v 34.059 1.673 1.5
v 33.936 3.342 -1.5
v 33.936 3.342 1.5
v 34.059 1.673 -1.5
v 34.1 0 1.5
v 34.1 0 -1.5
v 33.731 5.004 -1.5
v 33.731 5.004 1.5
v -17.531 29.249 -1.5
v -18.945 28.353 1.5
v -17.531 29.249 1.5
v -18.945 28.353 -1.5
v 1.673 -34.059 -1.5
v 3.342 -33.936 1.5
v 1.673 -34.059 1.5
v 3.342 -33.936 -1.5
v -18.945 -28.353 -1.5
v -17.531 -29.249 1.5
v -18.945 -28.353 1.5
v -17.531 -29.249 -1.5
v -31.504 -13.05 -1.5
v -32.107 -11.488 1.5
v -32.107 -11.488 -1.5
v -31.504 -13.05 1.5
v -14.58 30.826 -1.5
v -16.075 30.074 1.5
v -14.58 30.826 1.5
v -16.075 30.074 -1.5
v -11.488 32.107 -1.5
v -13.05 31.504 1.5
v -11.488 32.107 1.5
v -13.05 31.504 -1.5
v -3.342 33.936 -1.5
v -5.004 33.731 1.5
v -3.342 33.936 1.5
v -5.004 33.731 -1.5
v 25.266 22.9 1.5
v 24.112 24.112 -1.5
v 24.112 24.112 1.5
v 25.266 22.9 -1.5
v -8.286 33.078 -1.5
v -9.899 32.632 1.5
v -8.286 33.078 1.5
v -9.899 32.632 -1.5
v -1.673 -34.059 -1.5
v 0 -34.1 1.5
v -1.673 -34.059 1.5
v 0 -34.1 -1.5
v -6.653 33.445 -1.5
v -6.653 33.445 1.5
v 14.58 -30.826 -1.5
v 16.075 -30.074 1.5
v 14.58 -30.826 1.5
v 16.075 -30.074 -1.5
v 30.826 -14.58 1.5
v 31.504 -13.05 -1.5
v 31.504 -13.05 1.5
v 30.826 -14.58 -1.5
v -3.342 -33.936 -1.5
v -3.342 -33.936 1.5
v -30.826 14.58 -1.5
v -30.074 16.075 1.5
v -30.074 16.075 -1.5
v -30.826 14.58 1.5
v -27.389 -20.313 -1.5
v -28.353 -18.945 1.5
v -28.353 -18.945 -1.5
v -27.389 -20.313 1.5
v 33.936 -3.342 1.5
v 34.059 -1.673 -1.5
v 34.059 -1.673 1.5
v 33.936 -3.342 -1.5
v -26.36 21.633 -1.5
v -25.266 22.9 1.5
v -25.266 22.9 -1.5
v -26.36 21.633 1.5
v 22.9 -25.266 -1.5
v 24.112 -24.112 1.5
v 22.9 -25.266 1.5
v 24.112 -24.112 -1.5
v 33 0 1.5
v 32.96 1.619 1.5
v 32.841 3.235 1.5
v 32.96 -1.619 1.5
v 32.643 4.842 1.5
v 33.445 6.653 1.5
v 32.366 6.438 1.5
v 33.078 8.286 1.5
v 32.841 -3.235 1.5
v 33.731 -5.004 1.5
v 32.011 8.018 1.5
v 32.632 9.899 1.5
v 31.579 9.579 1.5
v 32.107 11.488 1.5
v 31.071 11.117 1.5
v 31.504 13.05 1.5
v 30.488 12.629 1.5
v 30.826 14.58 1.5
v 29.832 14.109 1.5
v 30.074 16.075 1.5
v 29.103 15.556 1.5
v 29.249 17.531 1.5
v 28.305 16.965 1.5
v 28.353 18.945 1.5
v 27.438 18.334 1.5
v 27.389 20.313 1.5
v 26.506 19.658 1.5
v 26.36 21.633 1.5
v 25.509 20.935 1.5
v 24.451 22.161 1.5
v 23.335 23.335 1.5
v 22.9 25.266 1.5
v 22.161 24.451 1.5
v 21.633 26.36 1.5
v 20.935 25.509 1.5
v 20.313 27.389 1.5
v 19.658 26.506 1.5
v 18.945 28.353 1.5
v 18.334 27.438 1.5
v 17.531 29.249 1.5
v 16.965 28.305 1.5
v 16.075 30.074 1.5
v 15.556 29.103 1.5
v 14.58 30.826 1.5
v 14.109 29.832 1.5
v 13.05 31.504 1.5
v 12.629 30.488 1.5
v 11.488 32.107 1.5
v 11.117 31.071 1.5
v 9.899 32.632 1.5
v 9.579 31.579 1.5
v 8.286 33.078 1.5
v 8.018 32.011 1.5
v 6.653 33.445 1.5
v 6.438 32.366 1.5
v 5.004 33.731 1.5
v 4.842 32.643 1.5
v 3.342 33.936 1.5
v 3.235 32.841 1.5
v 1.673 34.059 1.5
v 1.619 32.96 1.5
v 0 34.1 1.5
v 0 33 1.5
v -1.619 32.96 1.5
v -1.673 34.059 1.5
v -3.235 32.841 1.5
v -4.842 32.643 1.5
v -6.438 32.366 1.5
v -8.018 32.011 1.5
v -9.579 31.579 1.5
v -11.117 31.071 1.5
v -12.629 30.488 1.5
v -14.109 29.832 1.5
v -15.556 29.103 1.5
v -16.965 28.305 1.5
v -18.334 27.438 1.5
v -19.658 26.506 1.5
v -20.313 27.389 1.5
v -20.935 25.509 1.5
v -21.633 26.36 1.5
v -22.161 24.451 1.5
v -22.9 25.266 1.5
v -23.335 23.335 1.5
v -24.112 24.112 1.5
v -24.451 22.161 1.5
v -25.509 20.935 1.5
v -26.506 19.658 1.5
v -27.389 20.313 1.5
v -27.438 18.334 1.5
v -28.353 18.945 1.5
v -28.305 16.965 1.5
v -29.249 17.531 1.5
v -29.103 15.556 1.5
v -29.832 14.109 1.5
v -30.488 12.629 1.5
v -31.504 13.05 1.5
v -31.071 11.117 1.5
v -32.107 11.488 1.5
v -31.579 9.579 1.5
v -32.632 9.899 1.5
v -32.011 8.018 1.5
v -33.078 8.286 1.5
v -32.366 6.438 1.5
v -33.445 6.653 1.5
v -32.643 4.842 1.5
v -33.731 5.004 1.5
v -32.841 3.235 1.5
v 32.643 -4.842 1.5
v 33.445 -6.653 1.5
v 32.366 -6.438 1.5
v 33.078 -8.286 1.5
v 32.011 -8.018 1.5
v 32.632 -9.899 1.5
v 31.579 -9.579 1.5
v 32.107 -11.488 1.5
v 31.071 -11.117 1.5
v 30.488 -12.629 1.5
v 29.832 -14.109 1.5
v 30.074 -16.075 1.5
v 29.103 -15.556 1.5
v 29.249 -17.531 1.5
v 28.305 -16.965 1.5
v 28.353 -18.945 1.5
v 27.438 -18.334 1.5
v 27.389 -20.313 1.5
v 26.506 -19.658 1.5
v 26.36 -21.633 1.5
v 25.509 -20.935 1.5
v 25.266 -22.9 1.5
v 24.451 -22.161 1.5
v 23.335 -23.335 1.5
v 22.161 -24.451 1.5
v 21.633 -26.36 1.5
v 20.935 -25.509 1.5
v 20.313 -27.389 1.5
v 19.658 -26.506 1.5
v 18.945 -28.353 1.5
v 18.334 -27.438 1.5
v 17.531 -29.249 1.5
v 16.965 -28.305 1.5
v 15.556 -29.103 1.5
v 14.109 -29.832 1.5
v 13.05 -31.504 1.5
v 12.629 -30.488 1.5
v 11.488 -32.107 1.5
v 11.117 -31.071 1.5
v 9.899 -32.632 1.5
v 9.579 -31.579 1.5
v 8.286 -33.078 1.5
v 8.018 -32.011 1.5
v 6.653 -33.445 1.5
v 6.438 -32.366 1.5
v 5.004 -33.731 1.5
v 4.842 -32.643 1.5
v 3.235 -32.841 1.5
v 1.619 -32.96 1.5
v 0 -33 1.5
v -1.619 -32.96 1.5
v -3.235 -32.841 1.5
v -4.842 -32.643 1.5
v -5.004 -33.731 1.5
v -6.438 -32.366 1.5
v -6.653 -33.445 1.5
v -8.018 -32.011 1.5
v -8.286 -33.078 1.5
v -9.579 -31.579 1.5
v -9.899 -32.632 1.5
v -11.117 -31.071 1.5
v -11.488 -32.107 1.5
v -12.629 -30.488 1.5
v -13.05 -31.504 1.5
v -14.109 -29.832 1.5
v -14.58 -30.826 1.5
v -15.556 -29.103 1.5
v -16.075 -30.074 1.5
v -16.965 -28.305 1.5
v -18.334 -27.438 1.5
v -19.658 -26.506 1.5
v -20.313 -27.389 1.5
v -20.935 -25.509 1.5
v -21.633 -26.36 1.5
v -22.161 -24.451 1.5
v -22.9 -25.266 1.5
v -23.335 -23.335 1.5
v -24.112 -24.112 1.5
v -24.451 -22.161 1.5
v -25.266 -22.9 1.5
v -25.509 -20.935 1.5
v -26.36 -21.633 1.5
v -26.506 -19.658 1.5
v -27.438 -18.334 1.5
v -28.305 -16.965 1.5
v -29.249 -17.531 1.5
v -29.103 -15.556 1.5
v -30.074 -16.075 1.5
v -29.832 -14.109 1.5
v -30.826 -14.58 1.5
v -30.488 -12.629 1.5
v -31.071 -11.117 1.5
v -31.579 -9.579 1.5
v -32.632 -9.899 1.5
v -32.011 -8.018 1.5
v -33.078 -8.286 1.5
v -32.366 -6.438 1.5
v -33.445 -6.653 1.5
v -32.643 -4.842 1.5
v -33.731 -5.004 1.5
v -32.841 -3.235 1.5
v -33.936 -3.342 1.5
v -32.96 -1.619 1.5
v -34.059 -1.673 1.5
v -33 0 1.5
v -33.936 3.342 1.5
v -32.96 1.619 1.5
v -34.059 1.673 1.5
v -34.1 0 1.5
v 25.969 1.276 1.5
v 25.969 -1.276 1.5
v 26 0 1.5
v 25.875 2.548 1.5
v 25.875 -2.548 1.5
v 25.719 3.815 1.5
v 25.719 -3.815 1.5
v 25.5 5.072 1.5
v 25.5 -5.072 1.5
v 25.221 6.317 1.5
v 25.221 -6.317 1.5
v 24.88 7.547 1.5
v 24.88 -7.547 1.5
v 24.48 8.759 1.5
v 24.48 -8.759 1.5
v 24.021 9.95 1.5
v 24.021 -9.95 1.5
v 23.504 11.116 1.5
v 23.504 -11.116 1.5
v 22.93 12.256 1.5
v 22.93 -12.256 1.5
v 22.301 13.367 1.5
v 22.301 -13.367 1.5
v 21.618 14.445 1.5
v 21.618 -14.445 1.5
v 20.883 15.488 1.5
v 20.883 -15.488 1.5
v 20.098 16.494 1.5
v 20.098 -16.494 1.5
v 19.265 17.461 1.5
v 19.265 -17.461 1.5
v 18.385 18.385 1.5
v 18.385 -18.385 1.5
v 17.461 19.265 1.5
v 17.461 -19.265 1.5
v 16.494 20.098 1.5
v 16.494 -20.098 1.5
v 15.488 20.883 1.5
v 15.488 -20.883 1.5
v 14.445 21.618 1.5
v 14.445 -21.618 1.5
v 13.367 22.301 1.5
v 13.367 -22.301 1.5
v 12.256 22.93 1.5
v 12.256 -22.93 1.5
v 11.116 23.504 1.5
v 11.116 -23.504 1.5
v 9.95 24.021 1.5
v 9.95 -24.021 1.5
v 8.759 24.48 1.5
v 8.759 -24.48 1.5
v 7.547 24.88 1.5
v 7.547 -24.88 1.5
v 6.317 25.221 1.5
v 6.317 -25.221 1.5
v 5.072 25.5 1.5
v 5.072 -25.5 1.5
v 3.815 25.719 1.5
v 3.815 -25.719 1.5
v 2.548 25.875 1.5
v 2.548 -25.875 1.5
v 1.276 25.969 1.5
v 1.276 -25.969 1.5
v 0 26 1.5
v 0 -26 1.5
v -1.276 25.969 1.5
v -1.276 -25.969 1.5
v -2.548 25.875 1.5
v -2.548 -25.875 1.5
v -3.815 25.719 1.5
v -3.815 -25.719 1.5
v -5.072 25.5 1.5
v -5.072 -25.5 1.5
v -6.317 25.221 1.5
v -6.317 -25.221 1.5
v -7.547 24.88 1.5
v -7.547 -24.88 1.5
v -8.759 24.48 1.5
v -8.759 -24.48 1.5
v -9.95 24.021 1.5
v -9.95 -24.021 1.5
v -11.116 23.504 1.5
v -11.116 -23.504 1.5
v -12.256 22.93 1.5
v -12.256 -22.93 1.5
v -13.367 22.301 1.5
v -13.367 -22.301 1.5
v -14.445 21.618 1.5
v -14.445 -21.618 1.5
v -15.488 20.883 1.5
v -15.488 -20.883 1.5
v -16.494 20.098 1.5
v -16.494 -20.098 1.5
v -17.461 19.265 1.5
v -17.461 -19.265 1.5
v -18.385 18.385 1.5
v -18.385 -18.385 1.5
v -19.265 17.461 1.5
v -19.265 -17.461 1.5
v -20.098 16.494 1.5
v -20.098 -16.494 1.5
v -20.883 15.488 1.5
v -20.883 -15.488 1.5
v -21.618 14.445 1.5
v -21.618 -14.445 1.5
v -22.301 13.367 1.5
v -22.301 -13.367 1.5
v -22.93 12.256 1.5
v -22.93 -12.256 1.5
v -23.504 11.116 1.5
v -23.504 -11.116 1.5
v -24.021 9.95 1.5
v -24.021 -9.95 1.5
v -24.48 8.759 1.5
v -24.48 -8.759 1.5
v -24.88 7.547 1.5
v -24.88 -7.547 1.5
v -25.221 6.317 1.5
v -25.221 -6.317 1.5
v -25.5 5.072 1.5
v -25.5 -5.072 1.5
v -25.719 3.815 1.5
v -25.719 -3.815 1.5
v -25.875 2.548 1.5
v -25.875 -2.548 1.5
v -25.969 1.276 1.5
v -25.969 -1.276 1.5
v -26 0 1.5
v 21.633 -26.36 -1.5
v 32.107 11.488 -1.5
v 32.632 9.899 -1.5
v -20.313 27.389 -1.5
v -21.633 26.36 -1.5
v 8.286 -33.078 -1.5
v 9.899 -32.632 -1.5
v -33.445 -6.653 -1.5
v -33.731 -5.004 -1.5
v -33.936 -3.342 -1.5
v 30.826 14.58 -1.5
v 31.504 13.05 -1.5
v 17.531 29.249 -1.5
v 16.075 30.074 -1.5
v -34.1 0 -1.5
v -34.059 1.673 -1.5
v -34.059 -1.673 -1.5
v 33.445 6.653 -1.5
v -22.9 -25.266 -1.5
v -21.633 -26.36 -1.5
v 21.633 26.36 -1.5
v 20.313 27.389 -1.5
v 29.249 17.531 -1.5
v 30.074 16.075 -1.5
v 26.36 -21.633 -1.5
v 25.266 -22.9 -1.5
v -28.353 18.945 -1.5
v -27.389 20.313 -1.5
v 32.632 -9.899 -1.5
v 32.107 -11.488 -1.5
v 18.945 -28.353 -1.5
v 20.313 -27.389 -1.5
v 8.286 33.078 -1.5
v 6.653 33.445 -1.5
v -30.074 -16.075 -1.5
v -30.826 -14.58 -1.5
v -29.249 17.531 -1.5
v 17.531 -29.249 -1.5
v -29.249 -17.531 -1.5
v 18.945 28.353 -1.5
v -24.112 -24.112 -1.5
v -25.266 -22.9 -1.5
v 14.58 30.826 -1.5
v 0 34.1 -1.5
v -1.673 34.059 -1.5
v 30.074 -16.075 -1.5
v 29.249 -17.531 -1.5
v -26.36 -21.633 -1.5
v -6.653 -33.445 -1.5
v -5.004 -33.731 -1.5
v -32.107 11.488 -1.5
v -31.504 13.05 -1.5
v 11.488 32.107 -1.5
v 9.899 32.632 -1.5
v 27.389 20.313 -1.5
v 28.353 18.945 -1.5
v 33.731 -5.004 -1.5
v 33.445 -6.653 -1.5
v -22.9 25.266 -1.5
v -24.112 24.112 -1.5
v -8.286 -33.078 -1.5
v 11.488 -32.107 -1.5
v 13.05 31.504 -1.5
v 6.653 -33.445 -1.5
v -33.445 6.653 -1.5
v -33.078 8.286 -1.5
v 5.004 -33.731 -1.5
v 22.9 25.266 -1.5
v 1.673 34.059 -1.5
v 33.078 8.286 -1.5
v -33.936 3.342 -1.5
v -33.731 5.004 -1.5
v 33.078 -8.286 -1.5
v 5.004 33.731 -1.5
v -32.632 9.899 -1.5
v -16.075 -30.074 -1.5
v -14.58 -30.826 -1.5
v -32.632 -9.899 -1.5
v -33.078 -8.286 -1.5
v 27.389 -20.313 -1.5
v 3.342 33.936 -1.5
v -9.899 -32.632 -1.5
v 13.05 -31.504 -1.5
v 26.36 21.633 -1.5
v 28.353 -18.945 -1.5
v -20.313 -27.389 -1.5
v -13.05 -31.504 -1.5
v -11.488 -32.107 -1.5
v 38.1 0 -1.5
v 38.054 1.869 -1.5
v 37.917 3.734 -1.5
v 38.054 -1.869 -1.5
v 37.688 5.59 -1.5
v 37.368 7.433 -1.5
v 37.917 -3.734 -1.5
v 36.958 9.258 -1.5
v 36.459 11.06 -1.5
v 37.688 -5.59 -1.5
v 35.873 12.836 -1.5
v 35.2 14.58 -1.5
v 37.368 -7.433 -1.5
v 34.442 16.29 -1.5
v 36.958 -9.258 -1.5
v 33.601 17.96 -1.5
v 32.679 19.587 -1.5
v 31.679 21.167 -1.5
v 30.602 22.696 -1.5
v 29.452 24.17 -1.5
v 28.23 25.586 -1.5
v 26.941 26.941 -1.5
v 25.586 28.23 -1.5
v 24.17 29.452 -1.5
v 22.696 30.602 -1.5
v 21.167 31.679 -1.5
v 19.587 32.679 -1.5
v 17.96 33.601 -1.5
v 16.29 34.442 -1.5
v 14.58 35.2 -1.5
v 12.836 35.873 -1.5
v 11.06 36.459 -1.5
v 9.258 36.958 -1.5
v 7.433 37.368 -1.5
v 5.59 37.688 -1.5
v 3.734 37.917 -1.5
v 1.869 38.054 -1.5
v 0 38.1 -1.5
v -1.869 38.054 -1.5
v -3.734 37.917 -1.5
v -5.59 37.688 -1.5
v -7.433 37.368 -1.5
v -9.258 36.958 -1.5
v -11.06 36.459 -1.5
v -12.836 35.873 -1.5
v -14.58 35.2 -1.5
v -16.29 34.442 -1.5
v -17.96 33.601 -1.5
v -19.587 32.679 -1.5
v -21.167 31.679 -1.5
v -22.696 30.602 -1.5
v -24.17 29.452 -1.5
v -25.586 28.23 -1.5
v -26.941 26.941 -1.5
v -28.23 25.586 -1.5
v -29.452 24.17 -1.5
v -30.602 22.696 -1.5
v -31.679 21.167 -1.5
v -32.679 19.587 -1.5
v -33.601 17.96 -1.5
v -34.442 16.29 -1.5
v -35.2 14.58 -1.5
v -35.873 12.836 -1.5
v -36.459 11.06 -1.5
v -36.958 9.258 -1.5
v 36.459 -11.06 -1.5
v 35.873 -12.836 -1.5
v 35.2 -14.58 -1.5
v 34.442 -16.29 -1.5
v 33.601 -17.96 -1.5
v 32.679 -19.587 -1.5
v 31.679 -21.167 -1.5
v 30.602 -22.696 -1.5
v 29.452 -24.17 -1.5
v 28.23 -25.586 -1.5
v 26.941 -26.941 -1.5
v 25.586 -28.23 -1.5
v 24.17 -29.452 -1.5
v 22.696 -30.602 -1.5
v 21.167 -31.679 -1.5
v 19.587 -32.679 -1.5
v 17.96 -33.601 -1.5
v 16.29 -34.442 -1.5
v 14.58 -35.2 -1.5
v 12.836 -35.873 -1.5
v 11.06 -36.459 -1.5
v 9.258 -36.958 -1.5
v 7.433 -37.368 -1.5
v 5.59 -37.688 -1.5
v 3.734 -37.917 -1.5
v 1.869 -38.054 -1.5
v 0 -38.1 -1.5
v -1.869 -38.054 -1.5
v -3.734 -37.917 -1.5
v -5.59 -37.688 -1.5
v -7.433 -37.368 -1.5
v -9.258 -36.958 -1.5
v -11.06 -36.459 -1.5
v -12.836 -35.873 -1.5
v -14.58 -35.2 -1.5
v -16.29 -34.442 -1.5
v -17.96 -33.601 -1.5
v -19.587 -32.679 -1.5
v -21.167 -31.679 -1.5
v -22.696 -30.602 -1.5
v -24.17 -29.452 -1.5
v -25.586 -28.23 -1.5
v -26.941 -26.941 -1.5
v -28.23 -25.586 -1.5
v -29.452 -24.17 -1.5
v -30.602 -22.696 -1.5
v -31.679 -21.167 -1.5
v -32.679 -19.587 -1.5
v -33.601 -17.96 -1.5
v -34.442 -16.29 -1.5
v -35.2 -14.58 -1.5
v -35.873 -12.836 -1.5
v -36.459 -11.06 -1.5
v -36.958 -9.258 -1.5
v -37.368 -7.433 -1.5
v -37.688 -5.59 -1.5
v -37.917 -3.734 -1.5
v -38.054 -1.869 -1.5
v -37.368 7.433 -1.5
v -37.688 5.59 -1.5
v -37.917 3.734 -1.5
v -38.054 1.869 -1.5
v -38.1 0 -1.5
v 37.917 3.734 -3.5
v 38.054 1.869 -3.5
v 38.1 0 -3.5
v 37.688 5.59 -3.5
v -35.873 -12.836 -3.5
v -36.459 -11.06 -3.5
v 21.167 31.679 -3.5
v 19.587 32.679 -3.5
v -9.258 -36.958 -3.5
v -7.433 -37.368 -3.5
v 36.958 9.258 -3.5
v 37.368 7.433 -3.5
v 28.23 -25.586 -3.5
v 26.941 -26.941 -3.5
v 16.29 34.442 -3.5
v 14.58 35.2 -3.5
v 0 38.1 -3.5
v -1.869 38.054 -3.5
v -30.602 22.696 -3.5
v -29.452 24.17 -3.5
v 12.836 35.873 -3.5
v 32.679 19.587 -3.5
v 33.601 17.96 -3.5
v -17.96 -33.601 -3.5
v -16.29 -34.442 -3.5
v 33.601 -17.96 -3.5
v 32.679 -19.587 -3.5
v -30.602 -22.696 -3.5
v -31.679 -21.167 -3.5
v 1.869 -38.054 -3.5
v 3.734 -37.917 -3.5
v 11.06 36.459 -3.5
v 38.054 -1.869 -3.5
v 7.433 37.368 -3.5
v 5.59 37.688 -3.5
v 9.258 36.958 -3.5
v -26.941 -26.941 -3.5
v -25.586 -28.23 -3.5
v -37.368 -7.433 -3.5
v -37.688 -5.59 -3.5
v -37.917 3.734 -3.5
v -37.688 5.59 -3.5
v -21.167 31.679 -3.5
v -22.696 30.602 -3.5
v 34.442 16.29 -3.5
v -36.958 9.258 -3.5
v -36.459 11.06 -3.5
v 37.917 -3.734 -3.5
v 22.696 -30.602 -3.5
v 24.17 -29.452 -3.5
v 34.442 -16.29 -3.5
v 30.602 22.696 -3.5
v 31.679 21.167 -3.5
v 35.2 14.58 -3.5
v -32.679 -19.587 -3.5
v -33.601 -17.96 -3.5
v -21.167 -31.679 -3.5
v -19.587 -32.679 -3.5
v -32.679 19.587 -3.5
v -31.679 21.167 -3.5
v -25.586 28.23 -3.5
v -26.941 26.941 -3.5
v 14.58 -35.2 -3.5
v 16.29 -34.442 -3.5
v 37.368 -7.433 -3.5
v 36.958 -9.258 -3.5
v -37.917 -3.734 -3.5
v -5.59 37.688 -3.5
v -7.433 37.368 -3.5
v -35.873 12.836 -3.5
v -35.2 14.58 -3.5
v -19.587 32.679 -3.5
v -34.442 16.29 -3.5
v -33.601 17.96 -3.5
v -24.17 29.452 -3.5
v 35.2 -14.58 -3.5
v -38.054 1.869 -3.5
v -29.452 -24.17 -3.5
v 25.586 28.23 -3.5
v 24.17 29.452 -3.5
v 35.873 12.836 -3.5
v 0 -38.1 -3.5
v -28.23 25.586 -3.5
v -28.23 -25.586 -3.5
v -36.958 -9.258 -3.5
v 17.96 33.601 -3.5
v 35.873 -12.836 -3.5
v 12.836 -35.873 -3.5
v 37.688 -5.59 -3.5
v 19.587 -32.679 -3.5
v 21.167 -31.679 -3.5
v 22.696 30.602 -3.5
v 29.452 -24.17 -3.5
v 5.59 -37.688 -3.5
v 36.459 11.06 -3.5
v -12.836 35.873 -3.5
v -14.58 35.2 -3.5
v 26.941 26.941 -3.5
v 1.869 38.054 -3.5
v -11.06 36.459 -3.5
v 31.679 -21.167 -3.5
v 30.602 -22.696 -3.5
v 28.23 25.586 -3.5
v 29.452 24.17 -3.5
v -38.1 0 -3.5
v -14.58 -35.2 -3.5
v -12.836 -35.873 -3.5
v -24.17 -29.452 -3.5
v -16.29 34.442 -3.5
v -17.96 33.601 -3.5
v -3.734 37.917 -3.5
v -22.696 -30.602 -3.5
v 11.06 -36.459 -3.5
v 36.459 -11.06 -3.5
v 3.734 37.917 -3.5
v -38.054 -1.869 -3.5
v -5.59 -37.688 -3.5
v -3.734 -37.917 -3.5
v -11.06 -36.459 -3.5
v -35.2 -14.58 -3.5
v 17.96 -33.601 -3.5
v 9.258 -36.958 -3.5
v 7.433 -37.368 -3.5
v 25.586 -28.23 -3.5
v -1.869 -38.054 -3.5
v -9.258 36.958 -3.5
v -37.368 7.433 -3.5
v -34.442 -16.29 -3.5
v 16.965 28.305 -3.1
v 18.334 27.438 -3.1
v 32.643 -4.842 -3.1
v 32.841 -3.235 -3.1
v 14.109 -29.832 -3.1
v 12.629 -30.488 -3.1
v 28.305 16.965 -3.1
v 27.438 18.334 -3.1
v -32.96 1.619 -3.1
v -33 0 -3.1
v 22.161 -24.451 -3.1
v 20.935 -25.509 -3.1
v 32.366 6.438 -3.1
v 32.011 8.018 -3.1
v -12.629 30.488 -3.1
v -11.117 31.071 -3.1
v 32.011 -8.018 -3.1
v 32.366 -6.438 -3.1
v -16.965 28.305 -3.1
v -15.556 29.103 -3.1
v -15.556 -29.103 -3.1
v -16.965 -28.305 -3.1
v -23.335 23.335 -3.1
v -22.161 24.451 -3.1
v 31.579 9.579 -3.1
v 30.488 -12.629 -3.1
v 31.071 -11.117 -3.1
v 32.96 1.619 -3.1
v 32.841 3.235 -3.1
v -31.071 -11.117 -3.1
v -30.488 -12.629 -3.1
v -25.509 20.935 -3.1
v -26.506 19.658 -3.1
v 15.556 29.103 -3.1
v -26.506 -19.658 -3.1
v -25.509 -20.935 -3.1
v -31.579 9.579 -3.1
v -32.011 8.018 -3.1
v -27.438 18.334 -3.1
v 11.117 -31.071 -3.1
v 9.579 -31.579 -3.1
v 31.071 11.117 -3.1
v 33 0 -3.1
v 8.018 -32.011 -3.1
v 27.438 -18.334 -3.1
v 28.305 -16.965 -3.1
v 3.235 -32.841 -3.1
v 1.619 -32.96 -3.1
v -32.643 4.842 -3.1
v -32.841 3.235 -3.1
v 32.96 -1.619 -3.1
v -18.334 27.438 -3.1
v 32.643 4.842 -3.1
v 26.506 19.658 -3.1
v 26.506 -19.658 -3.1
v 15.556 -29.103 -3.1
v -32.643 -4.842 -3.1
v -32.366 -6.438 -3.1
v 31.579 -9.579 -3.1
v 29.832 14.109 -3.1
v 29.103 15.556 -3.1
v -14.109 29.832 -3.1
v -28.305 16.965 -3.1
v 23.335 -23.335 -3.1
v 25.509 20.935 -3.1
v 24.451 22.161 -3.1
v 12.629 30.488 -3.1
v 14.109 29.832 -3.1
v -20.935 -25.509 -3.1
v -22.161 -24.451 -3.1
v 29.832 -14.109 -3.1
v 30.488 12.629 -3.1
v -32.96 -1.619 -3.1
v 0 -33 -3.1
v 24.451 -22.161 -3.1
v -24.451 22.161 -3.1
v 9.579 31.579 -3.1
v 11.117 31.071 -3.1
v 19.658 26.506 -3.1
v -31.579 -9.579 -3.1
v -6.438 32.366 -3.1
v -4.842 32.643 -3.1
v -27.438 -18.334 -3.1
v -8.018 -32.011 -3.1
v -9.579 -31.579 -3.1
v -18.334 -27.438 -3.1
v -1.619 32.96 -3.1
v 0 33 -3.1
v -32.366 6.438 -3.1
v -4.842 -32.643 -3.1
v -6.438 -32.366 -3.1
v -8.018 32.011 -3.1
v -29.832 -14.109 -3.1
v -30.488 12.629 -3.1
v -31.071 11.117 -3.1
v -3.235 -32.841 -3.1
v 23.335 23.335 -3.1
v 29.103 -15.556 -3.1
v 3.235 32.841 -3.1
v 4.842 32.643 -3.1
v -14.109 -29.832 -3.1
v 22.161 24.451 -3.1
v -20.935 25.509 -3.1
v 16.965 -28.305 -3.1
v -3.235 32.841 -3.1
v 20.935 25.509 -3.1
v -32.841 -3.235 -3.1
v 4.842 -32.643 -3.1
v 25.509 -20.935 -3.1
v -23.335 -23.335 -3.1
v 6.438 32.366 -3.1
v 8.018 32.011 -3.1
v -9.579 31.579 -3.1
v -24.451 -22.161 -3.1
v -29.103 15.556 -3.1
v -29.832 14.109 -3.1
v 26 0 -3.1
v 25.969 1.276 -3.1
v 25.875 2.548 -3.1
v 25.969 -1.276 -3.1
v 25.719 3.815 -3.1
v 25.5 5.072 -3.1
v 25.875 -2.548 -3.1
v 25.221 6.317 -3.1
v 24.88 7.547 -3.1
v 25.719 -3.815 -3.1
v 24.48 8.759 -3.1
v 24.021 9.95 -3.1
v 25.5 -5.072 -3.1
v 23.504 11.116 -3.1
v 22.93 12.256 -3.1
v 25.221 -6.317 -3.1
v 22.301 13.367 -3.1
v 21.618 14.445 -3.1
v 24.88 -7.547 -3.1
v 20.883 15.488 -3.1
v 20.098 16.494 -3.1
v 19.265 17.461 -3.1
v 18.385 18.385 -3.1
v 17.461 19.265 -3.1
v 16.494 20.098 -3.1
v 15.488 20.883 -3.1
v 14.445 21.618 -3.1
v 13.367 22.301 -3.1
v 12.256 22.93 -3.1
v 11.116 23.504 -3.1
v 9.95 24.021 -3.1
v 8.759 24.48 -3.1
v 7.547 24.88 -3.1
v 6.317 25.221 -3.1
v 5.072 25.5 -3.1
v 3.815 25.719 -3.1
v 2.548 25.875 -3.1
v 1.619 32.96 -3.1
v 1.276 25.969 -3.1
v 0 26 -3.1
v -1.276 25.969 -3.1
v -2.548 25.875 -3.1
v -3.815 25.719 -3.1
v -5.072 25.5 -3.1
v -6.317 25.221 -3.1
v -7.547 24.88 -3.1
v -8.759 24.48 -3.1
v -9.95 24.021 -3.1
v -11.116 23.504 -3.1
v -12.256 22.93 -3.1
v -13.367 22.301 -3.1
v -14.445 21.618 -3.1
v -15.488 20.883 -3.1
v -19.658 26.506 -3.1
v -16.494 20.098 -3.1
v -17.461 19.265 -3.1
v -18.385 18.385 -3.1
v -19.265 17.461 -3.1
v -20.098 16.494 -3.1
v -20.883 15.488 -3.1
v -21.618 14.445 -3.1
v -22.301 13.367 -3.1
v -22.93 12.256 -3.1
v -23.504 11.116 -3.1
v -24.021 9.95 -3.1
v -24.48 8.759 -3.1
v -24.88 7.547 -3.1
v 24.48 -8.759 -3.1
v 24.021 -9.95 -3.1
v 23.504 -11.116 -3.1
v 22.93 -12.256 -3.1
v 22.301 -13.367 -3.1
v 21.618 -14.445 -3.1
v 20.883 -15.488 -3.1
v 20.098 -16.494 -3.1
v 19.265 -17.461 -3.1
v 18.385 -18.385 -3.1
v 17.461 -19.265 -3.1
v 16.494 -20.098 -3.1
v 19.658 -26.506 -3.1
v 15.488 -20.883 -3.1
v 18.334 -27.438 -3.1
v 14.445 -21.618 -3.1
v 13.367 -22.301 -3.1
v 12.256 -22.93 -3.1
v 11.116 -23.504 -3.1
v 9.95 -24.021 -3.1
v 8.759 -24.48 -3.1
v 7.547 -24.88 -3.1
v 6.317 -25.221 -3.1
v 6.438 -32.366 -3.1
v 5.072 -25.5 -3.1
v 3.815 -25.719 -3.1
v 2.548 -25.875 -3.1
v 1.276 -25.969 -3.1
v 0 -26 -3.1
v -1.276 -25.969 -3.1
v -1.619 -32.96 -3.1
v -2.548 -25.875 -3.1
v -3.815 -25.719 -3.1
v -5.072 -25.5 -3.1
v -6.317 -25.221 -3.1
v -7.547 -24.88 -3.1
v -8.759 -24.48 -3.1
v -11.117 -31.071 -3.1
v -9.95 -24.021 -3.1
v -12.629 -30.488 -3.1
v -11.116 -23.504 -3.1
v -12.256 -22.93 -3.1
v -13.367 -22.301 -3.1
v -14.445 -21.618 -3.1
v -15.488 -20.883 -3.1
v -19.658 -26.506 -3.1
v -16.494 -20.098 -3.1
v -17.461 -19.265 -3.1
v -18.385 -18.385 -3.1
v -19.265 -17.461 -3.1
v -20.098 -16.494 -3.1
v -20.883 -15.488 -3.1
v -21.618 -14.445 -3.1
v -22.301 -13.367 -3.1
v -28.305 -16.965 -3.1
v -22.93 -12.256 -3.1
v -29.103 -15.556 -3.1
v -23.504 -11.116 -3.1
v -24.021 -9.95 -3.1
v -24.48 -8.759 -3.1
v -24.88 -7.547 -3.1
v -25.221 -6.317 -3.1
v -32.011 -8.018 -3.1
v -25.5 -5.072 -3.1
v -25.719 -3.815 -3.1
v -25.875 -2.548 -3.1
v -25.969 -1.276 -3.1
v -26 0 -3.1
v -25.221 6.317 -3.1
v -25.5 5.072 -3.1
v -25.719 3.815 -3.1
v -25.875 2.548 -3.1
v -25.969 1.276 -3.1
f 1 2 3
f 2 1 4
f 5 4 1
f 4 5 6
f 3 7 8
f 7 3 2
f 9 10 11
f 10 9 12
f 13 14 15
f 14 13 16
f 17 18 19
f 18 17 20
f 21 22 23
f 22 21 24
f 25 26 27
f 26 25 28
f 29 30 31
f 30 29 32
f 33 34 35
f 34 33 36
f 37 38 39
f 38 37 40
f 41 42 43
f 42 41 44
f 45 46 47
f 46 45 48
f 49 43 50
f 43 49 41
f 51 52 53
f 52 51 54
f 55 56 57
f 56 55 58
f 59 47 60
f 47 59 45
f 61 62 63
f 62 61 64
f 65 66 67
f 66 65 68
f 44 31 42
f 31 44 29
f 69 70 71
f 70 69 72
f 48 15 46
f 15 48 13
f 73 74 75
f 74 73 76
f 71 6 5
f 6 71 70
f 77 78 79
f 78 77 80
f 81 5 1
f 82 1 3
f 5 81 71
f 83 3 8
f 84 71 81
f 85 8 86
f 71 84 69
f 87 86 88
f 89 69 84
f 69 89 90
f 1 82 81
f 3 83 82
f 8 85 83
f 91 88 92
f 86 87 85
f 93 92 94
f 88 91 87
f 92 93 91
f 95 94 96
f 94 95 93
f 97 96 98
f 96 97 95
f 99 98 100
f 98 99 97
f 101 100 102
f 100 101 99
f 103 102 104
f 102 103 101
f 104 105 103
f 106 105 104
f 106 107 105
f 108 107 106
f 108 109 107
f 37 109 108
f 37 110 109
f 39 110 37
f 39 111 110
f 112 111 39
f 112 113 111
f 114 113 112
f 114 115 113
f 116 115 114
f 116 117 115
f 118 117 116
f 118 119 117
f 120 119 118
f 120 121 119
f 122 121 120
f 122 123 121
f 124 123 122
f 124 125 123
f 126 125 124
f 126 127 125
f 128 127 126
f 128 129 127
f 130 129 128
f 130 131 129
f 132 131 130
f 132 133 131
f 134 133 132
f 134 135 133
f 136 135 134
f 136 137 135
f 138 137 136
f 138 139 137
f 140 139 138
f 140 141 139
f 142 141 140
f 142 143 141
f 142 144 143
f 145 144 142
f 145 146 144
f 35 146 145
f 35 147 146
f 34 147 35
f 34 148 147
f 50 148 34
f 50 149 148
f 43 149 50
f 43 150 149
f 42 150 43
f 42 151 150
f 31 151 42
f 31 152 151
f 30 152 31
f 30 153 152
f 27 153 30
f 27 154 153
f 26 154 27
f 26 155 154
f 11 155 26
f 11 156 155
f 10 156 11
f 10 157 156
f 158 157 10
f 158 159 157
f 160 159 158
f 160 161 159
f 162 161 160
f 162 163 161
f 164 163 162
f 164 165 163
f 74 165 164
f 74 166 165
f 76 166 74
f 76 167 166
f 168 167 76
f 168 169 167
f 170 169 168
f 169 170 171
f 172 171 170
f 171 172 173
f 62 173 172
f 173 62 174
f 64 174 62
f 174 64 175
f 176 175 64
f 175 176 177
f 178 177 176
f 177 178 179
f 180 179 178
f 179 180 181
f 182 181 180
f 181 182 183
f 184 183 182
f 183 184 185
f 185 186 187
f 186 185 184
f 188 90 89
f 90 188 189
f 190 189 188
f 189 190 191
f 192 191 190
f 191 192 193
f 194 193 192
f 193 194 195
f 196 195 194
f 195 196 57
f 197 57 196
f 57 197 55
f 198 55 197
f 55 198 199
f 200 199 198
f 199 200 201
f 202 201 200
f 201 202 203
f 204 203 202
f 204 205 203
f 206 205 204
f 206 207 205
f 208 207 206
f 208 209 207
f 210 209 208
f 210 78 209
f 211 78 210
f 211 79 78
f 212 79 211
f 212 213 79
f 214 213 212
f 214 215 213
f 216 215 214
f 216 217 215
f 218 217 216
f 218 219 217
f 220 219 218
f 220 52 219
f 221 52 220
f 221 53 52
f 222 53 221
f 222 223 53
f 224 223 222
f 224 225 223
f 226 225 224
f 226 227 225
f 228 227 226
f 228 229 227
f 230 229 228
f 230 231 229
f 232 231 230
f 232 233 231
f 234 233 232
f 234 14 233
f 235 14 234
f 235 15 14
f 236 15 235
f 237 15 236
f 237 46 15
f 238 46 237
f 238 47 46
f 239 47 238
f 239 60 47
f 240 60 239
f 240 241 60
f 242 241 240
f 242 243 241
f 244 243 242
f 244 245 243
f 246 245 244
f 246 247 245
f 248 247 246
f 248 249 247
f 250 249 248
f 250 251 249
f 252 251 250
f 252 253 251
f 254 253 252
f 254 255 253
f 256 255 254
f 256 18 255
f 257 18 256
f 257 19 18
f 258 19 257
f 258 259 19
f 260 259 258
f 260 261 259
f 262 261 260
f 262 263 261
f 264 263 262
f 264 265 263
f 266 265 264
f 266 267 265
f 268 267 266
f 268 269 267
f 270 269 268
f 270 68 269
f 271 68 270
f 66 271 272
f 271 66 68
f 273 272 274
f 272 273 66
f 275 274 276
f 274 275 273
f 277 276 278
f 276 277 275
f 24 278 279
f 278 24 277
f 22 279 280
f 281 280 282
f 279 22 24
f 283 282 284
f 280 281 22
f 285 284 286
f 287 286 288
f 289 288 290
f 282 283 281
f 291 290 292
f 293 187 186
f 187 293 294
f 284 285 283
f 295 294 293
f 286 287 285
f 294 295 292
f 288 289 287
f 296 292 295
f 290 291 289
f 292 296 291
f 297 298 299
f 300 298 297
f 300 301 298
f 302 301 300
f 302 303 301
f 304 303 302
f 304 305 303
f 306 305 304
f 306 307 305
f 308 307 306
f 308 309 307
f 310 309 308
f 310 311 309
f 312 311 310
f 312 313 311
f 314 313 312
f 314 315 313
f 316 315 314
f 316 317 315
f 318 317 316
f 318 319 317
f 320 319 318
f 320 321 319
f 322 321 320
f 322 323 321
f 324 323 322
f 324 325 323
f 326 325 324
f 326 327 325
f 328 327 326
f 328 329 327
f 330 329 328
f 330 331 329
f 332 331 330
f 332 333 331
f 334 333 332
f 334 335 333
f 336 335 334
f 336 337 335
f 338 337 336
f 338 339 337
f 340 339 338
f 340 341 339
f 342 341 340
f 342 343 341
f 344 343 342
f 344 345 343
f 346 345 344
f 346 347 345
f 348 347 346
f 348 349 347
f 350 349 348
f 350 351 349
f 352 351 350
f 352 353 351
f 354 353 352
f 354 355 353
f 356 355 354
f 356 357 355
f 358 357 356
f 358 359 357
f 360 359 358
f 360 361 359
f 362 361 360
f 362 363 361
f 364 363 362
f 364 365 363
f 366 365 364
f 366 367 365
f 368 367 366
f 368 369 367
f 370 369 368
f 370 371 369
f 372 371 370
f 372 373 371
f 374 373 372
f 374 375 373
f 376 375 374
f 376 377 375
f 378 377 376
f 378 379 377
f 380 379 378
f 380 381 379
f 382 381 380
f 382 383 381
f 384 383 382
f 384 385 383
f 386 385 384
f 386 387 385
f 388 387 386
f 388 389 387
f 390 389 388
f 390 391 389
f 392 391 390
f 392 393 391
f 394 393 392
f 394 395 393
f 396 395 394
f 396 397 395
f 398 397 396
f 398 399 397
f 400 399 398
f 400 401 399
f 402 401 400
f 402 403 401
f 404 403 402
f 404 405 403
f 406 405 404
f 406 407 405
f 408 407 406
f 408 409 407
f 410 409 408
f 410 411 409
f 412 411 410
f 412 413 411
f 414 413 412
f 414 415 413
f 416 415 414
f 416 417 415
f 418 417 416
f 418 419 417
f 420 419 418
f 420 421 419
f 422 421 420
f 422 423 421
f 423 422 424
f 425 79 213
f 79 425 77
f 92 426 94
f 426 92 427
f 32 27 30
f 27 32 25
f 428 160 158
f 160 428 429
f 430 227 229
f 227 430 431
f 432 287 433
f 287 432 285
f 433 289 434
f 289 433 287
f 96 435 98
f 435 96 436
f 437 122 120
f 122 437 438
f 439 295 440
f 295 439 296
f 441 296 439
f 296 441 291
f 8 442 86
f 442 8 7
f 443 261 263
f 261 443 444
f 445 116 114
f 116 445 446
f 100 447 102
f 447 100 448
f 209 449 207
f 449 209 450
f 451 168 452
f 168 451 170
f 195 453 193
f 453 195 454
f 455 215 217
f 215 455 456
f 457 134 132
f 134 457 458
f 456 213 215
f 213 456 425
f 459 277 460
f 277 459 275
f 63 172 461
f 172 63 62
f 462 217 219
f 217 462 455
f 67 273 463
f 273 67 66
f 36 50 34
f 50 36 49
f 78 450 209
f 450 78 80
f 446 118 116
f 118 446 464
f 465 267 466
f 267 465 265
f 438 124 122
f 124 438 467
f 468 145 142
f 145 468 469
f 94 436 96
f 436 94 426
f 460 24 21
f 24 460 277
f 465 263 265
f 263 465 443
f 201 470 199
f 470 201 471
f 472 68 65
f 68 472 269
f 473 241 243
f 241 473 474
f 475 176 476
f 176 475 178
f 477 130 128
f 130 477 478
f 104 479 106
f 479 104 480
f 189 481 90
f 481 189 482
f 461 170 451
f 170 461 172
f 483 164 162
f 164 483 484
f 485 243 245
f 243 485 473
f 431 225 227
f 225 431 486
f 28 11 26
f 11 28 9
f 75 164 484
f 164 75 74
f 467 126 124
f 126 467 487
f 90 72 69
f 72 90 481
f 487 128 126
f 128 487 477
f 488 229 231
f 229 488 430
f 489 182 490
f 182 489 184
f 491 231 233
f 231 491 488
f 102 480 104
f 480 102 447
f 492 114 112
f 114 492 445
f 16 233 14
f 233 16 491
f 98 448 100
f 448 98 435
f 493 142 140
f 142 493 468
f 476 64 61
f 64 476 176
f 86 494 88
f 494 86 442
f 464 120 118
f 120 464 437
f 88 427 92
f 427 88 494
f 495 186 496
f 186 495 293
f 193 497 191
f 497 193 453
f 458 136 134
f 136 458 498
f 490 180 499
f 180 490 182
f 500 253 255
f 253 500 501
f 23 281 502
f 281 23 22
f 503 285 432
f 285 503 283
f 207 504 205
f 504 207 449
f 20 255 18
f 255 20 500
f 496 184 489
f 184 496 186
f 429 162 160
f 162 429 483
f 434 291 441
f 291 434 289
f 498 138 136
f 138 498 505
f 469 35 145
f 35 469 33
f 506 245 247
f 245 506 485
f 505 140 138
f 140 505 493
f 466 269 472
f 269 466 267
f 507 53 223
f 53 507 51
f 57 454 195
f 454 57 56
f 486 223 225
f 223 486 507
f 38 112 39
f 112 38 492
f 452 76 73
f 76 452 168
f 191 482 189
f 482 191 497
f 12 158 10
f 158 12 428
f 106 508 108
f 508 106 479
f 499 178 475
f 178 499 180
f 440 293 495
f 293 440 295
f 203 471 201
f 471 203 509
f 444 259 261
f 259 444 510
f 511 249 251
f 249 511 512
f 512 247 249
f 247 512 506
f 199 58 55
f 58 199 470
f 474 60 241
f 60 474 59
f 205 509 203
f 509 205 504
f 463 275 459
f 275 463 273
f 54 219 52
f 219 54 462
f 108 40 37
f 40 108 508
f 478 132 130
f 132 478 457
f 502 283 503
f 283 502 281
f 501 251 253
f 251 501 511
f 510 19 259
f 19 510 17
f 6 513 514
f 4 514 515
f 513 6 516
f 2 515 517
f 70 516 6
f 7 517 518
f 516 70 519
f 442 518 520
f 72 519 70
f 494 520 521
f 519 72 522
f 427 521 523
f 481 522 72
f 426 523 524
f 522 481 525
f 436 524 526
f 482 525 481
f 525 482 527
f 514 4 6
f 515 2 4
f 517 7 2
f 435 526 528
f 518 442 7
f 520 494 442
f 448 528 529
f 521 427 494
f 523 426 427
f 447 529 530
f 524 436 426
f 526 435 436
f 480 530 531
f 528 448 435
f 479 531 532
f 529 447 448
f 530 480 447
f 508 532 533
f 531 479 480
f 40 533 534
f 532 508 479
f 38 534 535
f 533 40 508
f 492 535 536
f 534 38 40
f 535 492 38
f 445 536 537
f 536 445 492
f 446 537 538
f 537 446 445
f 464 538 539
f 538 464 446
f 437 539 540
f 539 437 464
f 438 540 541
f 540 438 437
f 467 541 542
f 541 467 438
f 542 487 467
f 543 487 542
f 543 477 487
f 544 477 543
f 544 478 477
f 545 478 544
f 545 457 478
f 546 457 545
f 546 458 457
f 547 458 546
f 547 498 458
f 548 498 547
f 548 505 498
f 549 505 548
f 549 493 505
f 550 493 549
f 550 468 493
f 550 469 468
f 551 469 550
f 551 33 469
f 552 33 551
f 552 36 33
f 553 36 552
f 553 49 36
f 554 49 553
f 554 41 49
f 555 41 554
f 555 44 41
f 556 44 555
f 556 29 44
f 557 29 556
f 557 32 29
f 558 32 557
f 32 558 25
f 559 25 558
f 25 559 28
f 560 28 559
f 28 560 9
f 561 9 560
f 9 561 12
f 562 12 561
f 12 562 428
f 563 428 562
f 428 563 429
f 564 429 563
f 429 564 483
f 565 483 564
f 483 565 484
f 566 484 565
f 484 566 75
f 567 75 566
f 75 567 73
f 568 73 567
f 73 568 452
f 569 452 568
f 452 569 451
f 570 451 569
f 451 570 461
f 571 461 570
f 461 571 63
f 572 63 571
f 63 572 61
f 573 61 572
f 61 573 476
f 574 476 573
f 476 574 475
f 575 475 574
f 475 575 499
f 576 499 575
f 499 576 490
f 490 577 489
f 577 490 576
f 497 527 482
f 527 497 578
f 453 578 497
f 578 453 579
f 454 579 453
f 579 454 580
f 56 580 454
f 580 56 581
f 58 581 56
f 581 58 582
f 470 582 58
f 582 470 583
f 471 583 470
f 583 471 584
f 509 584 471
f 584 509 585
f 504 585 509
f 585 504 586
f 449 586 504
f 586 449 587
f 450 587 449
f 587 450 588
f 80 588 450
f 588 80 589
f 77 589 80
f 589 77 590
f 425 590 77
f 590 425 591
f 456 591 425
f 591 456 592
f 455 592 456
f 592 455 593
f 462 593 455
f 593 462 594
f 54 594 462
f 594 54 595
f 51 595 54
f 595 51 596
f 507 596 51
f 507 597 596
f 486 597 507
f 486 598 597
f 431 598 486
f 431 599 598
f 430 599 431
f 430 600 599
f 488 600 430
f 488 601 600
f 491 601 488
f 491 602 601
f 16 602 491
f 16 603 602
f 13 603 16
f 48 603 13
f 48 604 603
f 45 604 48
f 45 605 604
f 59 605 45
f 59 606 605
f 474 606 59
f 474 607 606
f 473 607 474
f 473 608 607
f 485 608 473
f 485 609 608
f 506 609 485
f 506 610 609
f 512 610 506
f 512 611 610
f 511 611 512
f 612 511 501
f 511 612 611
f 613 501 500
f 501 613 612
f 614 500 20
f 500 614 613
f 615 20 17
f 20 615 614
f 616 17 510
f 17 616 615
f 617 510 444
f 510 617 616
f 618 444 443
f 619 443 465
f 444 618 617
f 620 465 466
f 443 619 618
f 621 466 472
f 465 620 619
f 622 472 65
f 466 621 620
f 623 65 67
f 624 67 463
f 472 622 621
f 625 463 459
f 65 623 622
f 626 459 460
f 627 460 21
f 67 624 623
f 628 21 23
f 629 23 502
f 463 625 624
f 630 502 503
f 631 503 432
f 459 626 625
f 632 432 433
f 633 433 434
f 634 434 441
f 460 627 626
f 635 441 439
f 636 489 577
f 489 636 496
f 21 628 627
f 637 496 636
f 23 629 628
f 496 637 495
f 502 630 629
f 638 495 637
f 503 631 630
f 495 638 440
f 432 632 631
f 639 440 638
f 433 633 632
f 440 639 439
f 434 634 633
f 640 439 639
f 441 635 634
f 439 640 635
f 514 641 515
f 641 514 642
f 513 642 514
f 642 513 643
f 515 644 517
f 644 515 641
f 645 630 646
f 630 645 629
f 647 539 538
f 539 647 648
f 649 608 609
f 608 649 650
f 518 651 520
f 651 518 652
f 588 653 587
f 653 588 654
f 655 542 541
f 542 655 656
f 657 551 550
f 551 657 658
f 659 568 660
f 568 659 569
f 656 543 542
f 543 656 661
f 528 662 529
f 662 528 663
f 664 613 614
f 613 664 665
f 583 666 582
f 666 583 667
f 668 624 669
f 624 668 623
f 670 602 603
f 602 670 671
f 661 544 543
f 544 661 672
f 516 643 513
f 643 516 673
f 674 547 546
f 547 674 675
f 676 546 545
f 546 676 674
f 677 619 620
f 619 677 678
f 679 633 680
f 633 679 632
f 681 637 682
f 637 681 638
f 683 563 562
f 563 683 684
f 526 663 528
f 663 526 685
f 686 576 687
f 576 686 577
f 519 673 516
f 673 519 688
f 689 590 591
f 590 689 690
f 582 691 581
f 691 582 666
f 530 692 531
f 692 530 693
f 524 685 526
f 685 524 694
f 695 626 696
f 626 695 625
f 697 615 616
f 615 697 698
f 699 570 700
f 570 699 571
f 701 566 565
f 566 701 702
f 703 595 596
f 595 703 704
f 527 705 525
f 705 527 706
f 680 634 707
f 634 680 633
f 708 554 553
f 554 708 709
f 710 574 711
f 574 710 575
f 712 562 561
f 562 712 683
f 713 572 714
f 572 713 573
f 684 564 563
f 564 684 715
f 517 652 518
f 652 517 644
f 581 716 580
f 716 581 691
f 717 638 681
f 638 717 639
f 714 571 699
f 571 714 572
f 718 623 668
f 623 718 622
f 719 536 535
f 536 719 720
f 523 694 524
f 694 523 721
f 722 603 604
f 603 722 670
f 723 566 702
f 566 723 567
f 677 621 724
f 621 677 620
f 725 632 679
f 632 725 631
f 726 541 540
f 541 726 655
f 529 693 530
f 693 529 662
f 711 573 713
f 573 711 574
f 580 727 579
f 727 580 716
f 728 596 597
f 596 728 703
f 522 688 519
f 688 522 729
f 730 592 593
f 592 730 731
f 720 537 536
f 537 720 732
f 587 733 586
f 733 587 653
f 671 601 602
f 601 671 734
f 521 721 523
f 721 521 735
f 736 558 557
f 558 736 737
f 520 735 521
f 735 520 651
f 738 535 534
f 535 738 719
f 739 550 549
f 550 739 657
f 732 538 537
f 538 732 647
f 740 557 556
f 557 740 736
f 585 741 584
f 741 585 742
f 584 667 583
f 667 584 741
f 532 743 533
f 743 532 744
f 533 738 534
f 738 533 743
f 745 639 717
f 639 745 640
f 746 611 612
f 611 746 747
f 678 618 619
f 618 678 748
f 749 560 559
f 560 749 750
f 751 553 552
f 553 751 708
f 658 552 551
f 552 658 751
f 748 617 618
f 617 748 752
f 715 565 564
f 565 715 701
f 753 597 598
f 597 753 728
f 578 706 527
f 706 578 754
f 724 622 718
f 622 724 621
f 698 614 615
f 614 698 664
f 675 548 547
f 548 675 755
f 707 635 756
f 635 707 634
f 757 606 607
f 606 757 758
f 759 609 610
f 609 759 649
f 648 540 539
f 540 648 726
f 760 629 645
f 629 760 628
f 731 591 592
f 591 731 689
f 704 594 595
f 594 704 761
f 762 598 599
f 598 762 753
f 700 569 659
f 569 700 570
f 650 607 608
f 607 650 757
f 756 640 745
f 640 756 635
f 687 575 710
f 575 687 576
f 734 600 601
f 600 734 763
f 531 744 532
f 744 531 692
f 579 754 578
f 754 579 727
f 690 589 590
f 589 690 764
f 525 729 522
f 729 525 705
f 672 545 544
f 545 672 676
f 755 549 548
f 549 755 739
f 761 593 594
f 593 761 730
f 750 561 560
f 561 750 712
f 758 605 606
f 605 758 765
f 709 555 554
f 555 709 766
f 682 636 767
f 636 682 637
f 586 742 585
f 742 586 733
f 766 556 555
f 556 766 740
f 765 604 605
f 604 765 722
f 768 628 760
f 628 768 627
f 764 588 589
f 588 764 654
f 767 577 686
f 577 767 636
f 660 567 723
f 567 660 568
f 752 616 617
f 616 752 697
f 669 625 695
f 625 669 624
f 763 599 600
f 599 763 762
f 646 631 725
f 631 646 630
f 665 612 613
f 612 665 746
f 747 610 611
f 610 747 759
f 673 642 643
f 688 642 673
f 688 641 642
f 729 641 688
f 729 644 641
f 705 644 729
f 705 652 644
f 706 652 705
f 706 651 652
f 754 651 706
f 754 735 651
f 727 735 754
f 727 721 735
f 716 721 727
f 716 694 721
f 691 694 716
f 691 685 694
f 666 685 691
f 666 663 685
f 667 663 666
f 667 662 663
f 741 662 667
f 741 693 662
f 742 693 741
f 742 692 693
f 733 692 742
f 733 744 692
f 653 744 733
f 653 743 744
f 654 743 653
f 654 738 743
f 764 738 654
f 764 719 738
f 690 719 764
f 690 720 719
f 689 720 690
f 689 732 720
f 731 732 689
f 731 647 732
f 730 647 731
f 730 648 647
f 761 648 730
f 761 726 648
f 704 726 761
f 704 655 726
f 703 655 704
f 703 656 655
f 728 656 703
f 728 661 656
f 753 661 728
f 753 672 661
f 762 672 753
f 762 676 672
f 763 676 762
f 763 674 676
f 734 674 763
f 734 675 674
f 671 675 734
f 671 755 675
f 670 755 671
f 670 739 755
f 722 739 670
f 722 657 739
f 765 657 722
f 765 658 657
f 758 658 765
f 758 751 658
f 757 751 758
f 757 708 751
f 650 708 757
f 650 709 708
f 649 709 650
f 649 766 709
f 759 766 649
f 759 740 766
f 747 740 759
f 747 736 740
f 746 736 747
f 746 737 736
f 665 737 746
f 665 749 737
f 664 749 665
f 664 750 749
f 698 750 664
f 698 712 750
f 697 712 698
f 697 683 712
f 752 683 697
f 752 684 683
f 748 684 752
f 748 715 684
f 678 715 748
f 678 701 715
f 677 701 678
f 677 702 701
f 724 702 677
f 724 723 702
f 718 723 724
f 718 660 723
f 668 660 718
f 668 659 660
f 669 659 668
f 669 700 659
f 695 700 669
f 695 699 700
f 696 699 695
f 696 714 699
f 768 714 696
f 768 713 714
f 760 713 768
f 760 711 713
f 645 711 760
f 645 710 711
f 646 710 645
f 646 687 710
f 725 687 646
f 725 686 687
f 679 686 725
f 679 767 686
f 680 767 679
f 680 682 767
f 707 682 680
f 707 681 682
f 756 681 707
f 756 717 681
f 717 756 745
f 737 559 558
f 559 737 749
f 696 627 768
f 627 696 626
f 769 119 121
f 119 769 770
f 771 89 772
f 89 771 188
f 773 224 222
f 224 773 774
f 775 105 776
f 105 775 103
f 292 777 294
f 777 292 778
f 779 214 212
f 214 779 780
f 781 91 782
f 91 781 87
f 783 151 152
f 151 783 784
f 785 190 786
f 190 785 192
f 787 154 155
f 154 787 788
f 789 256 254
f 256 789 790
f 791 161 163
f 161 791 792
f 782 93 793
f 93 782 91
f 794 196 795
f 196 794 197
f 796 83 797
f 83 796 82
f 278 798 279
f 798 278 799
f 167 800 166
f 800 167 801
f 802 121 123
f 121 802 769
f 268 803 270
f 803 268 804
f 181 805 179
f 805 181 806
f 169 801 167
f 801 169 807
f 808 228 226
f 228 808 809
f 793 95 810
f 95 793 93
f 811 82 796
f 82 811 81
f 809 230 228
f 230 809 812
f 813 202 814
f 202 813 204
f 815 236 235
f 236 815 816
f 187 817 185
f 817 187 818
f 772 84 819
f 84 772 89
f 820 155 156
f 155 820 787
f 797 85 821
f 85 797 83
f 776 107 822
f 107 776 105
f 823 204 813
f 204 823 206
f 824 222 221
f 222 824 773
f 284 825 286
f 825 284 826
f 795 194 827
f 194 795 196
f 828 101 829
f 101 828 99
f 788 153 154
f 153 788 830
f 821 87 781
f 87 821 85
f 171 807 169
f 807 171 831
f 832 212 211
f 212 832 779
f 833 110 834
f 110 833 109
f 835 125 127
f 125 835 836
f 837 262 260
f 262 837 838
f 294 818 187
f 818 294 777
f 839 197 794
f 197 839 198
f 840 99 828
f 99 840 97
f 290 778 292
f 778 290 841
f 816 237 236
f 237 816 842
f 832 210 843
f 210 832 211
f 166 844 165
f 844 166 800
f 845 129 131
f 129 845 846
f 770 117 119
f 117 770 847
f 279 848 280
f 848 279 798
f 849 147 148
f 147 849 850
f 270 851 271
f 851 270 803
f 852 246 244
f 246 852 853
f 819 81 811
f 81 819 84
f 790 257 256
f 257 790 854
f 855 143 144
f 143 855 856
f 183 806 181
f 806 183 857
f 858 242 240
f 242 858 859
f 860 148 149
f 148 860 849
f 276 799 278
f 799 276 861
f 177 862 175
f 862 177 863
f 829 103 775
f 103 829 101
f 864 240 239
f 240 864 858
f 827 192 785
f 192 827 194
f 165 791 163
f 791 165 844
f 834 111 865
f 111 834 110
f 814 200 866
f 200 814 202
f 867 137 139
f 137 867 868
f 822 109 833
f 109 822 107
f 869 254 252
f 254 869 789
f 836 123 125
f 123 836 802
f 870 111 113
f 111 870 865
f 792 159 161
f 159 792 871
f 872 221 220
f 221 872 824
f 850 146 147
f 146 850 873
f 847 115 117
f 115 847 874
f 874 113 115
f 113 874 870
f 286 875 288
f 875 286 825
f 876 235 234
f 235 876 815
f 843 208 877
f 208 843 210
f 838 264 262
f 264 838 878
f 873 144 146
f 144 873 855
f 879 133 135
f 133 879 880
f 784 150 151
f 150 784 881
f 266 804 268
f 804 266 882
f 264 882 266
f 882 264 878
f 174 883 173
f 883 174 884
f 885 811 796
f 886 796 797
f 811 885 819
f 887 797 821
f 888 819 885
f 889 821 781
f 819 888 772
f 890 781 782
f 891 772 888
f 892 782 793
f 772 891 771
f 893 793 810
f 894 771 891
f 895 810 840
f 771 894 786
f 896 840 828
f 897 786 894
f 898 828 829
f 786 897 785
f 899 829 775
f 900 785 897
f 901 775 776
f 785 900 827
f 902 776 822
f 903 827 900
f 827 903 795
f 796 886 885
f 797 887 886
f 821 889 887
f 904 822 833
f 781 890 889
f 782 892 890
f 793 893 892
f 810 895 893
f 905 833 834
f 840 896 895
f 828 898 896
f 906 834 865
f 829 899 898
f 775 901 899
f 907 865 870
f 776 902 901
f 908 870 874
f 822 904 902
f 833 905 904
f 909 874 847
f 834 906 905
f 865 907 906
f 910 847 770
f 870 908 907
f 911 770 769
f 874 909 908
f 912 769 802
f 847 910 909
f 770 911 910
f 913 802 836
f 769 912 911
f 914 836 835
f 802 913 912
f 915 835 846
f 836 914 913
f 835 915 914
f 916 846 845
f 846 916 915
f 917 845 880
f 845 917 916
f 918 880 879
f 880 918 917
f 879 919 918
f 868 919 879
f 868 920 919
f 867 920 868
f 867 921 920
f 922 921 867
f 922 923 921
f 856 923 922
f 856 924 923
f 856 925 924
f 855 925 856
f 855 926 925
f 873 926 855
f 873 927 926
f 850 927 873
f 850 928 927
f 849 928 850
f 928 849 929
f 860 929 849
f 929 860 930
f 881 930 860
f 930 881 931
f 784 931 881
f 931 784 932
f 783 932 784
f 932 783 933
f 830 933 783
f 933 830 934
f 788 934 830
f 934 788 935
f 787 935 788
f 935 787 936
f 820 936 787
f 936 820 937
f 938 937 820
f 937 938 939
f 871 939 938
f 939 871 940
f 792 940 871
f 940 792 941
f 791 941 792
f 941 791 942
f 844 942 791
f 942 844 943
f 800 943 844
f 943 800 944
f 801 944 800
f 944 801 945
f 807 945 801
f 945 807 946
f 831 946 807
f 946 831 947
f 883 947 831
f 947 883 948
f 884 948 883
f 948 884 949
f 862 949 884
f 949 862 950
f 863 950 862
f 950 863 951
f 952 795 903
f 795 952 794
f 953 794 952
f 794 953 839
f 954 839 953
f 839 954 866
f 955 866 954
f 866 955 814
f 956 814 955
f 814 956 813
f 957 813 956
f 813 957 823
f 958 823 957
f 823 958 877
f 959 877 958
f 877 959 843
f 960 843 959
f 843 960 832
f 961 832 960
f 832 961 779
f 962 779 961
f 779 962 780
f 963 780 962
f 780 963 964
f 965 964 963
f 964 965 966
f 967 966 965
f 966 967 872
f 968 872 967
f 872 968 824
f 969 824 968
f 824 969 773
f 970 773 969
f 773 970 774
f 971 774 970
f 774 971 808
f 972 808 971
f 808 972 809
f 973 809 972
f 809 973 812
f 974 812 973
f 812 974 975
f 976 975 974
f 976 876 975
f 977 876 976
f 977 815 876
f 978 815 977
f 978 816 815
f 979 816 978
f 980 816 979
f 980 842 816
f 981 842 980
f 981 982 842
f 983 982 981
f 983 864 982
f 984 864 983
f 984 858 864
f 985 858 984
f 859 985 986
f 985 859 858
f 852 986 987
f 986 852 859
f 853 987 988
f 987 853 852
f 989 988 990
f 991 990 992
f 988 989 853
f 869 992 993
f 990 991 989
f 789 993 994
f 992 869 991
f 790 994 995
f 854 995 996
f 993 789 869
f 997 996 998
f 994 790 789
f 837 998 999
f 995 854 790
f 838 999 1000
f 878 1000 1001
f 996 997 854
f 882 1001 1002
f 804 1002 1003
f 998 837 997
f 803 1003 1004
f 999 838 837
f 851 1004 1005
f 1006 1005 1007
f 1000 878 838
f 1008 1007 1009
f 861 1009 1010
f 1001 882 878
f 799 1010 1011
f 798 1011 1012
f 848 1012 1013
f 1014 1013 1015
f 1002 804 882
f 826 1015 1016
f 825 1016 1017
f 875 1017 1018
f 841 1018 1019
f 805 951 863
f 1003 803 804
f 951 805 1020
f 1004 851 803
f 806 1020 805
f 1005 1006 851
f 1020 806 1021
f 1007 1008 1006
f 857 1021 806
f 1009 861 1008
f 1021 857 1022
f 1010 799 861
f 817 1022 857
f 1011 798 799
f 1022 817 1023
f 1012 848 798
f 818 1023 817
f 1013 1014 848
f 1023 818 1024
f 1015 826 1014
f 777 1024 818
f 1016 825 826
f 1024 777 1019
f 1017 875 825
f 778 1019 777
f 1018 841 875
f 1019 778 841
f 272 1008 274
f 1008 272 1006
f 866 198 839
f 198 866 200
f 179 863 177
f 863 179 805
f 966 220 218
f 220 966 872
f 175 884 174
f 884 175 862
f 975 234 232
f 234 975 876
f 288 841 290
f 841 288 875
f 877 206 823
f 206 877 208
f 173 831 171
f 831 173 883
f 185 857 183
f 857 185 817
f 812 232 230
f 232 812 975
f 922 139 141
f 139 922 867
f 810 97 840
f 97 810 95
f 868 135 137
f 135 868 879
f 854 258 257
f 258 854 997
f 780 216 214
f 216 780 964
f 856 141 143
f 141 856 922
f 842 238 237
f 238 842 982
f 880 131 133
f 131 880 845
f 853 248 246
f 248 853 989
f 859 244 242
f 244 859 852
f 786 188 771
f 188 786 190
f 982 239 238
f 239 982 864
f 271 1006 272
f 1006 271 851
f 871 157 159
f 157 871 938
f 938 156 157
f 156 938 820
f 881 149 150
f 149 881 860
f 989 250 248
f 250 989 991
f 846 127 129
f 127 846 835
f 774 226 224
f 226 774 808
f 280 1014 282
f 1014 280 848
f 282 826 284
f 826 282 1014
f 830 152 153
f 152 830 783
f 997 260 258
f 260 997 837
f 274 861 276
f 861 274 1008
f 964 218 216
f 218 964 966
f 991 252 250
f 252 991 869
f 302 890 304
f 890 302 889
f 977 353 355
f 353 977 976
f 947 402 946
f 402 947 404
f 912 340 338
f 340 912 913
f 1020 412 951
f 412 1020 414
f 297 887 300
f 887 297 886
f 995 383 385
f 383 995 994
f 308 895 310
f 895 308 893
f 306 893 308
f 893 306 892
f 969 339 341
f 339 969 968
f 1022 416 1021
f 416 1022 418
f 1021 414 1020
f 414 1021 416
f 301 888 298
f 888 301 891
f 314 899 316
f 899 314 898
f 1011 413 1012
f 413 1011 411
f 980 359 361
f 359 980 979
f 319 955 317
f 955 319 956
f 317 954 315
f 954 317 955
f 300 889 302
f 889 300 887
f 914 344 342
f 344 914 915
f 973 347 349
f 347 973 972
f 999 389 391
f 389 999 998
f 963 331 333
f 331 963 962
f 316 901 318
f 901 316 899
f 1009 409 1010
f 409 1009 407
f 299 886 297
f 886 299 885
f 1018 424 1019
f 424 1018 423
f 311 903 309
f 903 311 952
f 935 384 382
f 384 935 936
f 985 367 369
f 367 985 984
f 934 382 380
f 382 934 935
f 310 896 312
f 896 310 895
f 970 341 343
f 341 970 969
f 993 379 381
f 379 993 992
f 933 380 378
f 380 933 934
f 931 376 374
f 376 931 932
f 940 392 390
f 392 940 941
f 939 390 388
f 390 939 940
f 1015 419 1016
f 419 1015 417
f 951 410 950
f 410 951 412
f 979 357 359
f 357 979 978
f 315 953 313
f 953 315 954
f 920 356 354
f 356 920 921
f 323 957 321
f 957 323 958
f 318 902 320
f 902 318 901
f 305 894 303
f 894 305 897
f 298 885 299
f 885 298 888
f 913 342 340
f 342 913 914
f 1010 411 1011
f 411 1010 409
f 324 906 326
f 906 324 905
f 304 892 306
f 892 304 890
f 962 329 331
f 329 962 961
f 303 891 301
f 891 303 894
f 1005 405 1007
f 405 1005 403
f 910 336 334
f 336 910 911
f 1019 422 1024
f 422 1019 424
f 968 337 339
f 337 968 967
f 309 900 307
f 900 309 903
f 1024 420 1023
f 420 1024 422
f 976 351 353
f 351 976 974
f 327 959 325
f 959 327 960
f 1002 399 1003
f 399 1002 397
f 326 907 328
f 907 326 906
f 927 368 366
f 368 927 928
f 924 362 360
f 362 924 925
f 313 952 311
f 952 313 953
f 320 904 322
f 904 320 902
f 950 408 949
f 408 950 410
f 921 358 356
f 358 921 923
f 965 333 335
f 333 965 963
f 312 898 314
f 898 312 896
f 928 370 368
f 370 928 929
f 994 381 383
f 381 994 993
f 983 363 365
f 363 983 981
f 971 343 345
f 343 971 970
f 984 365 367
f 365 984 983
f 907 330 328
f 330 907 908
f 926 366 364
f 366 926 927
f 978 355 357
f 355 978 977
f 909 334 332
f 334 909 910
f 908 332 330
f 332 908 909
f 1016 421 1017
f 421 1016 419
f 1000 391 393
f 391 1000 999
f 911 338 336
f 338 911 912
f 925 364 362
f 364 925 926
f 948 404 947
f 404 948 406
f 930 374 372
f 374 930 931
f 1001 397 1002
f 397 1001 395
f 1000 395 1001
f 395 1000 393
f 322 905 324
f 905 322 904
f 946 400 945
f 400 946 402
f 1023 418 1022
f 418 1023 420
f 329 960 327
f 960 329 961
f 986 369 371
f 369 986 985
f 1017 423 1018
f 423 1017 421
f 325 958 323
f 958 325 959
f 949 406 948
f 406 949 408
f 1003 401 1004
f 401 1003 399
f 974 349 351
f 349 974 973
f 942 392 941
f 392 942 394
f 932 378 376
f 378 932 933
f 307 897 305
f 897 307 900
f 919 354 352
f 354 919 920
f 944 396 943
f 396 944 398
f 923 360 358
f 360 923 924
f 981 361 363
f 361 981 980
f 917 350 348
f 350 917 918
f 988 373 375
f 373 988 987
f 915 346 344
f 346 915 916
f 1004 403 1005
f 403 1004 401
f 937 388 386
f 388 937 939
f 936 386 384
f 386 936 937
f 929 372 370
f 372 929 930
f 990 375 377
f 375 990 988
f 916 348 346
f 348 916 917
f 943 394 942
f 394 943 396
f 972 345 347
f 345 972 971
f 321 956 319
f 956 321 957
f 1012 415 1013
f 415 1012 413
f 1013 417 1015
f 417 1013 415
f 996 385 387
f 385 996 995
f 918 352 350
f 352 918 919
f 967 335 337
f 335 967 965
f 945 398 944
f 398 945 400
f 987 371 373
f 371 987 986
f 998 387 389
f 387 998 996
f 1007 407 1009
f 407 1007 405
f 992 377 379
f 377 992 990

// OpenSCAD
ringHeight=3;
capHeight=2;
kegTowerOD=3*25.4;
wallThickness=4;
overlap=20;
screenCoverThickness=0.4;

module neopixelRing(ledCount=24)
{
    // https://www.amazon.com/DIYmall-WS2812B-Integrated-Addressable-Raspberry/dp/B0C7CC3267
    ledOD = ledCount==24 ? 66 : 0 ;
    ledID = ledCount==24 ? 52 : 0 ;
    ledH=ringHeight+capHeight;
    
    difference()
    {
        cylinder(d=ledOD,h=ledH,center=true,$fn=128);
        cylinder(d=ledID,h=ledH,center=true,$fn=128);
    }
}


module plainCap()
{

  cylinder(h=ringHeight,d=kegTowerOD-2*wallThickness, center=true,$fn=128);
  translate([0,0,-(ringHeight+capHeight)/2])cylinder(d=kegTowerOD,h=capHeight, center=true, $fn=128);

  pegD=0.5;
  translate([(kegTowerOD-2*wallThickness-pegD)/2,0,0])cylinder(d=pegD,h=ringHeight,center=true, $fn=64);
  translate([-(kegTowerOD-2*wallThickness-pegD)/2,0,0])cylinder(d=pegD,h=ringHeight,center=true, $fn=64);
  translate([0,(kegTowerOD-2*wallThickness-pegD)/2,0])cylinder(d=pegD,h=ringHeight,center=true, $fn=64);
  translate([0,-(kegTowerOD-2*wallThickness-pegD)/2,0])cylinder(d=pegD,h=ringHeight,center=true, $fn=64);
  
}

module cap()
{
    difference()
    {
        plainCap();
        translate([0,0,screenCoverThickness-capHeight/2])neopixelRing(24);
    }
}


cap();
